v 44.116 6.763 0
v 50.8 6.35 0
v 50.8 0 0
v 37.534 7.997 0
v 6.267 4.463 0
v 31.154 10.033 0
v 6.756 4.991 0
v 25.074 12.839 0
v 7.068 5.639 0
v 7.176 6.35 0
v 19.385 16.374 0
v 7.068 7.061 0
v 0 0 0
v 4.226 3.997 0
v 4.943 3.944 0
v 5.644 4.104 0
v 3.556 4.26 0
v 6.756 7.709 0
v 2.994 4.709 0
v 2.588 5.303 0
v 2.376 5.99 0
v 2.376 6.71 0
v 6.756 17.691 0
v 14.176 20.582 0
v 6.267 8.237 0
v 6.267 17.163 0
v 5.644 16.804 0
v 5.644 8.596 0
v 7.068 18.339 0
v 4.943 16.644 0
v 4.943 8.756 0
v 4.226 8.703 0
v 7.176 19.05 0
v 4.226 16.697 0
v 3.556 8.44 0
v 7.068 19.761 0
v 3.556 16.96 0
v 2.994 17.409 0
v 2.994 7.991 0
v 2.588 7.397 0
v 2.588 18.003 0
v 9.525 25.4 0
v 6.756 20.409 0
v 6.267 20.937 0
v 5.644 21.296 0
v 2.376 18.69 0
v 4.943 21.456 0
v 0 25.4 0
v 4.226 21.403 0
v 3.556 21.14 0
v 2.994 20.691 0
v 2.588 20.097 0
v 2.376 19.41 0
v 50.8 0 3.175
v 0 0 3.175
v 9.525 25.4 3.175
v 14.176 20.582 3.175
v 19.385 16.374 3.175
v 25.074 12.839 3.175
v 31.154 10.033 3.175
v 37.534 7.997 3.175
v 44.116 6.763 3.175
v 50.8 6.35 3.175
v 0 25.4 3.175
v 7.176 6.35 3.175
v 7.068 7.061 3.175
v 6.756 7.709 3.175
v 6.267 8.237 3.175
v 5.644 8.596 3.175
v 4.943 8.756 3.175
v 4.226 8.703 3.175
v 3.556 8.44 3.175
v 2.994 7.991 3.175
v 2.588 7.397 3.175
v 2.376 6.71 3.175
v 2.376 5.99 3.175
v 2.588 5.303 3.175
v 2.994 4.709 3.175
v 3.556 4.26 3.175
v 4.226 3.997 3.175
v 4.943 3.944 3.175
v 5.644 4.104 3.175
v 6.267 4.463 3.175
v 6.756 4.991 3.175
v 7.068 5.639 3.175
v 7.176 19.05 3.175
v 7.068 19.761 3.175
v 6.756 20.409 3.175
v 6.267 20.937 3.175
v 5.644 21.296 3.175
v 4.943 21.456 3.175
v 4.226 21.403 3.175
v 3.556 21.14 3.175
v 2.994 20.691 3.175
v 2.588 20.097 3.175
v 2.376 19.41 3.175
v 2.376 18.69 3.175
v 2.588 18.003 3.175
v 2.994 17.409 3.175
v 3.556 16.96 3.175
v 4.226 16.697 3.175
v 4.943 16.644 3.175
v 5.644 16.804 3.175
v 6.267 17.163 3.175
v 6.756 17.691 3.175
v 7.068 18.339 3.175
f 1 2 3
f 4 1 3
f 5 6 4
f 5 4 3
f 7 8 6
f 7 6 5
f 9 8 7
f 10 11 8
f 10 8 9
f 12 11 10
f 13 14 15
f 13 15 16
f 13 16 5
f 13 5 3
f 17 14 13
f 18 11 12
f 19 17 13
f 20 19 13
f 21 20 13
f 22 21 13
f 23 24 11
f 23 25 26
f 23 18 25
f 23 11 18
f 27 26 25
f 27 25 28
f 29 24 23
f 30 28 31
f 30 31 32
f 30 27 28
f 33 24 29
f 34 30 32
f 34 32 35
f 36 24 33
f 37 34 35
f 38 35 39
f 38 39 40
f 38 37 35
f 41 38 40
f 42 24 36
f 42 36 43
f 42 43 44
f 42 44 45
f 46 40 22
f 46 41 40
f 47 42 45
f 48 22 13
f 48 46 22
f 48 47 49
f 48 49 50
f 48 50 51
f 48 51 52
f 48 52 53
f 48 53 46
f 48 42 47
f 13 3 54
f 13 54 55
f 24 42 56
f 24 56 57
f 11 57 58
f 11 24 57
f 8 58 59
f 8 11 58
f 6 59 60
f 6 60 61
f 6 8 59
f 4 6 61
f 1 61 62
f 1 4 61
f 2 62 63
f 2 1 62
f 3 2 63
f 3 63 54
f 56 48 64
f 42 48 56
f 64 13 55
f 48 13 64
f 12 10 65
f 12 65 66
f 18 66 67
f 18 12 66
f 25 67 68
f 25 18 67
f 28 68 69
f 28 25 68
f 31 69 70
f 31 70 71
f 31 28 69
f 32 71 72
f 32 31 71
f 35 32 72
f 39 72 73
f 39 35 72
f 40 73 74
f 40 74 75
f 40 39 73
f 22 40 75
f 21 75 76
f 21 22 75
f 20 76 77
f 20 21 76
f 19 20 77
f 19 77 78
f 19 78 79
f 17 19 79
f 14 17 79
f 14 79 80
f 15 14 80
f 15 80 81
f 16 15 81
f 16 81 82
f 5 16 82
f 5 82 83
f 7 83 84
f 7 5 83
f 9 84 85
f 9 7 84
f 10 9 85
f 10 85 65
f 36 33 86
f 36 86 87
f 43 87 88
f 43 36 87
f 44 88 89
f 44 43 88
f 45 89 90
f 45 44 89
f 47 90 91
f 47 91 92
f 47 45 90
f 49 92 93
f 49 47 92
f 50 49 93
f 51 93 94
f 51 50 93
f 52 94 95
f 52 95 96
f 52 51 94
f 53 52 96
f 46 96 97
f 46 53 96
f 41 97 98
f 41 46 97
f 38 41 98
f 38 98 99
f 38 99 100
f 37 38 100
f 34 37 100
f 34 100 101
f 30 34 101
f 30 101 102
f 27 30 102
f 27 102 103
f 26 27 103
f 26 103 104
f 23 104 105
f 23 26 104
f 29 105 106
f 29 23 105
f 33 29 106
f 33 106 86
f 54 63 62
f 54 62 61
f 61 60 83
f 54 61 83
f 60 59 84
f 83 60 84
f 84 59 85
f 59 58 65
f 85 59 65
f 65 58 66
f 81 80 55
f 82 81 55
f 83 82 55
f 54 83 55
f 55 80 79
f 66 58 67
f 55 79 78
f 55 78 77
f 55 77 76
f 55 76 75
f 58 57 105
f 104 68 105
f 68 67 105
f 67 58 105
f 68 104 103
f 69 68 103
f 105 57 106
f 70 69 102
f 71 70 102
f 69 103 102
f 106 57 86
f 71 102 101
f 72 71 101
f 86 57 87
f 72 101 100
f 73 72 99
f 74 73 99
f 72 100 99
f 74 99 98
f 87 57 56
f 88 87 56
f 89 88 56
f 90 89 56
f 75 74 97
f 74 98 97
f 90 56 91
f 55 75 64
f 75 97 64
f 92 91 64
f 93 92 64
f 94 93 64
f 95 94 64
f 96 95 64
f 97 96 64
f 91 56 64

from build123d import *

# Parameters (mm, degrees)
SKETCH1_R           = 2.413
BOSS_EXTRUDE1_DEPTH = 3.175


with BuildPart() as part:
    # Sketch1 → Boss-Extrude1 (new body)
    with BuildSketch(Plane.XY):
        with BuildLine():
            Line((0, 0), (0, 25.4))
            Line((0, 25.4), (9.525, 25.4))
            ThreePointArc((9.525, 25.4), (28.070459062, 11.342244634), (50.8, 6.35))
            Line((50.8, 6.35), (50.8, 0))
            Line((50.8, 0), (0, 0))
        make_face()
        with Locations((4.7625, 6.35)):
            Circle(SKETCH1_R, mode=Mode.SUBTRACT)
        with Locations((4.7625, 19.05)):
            Circle(SKETCH1_R, mode=Mode.SUBTRACT)
    extrude(amount=BOSS_EXTRUDE1_DEPTH)


solid = part.part
